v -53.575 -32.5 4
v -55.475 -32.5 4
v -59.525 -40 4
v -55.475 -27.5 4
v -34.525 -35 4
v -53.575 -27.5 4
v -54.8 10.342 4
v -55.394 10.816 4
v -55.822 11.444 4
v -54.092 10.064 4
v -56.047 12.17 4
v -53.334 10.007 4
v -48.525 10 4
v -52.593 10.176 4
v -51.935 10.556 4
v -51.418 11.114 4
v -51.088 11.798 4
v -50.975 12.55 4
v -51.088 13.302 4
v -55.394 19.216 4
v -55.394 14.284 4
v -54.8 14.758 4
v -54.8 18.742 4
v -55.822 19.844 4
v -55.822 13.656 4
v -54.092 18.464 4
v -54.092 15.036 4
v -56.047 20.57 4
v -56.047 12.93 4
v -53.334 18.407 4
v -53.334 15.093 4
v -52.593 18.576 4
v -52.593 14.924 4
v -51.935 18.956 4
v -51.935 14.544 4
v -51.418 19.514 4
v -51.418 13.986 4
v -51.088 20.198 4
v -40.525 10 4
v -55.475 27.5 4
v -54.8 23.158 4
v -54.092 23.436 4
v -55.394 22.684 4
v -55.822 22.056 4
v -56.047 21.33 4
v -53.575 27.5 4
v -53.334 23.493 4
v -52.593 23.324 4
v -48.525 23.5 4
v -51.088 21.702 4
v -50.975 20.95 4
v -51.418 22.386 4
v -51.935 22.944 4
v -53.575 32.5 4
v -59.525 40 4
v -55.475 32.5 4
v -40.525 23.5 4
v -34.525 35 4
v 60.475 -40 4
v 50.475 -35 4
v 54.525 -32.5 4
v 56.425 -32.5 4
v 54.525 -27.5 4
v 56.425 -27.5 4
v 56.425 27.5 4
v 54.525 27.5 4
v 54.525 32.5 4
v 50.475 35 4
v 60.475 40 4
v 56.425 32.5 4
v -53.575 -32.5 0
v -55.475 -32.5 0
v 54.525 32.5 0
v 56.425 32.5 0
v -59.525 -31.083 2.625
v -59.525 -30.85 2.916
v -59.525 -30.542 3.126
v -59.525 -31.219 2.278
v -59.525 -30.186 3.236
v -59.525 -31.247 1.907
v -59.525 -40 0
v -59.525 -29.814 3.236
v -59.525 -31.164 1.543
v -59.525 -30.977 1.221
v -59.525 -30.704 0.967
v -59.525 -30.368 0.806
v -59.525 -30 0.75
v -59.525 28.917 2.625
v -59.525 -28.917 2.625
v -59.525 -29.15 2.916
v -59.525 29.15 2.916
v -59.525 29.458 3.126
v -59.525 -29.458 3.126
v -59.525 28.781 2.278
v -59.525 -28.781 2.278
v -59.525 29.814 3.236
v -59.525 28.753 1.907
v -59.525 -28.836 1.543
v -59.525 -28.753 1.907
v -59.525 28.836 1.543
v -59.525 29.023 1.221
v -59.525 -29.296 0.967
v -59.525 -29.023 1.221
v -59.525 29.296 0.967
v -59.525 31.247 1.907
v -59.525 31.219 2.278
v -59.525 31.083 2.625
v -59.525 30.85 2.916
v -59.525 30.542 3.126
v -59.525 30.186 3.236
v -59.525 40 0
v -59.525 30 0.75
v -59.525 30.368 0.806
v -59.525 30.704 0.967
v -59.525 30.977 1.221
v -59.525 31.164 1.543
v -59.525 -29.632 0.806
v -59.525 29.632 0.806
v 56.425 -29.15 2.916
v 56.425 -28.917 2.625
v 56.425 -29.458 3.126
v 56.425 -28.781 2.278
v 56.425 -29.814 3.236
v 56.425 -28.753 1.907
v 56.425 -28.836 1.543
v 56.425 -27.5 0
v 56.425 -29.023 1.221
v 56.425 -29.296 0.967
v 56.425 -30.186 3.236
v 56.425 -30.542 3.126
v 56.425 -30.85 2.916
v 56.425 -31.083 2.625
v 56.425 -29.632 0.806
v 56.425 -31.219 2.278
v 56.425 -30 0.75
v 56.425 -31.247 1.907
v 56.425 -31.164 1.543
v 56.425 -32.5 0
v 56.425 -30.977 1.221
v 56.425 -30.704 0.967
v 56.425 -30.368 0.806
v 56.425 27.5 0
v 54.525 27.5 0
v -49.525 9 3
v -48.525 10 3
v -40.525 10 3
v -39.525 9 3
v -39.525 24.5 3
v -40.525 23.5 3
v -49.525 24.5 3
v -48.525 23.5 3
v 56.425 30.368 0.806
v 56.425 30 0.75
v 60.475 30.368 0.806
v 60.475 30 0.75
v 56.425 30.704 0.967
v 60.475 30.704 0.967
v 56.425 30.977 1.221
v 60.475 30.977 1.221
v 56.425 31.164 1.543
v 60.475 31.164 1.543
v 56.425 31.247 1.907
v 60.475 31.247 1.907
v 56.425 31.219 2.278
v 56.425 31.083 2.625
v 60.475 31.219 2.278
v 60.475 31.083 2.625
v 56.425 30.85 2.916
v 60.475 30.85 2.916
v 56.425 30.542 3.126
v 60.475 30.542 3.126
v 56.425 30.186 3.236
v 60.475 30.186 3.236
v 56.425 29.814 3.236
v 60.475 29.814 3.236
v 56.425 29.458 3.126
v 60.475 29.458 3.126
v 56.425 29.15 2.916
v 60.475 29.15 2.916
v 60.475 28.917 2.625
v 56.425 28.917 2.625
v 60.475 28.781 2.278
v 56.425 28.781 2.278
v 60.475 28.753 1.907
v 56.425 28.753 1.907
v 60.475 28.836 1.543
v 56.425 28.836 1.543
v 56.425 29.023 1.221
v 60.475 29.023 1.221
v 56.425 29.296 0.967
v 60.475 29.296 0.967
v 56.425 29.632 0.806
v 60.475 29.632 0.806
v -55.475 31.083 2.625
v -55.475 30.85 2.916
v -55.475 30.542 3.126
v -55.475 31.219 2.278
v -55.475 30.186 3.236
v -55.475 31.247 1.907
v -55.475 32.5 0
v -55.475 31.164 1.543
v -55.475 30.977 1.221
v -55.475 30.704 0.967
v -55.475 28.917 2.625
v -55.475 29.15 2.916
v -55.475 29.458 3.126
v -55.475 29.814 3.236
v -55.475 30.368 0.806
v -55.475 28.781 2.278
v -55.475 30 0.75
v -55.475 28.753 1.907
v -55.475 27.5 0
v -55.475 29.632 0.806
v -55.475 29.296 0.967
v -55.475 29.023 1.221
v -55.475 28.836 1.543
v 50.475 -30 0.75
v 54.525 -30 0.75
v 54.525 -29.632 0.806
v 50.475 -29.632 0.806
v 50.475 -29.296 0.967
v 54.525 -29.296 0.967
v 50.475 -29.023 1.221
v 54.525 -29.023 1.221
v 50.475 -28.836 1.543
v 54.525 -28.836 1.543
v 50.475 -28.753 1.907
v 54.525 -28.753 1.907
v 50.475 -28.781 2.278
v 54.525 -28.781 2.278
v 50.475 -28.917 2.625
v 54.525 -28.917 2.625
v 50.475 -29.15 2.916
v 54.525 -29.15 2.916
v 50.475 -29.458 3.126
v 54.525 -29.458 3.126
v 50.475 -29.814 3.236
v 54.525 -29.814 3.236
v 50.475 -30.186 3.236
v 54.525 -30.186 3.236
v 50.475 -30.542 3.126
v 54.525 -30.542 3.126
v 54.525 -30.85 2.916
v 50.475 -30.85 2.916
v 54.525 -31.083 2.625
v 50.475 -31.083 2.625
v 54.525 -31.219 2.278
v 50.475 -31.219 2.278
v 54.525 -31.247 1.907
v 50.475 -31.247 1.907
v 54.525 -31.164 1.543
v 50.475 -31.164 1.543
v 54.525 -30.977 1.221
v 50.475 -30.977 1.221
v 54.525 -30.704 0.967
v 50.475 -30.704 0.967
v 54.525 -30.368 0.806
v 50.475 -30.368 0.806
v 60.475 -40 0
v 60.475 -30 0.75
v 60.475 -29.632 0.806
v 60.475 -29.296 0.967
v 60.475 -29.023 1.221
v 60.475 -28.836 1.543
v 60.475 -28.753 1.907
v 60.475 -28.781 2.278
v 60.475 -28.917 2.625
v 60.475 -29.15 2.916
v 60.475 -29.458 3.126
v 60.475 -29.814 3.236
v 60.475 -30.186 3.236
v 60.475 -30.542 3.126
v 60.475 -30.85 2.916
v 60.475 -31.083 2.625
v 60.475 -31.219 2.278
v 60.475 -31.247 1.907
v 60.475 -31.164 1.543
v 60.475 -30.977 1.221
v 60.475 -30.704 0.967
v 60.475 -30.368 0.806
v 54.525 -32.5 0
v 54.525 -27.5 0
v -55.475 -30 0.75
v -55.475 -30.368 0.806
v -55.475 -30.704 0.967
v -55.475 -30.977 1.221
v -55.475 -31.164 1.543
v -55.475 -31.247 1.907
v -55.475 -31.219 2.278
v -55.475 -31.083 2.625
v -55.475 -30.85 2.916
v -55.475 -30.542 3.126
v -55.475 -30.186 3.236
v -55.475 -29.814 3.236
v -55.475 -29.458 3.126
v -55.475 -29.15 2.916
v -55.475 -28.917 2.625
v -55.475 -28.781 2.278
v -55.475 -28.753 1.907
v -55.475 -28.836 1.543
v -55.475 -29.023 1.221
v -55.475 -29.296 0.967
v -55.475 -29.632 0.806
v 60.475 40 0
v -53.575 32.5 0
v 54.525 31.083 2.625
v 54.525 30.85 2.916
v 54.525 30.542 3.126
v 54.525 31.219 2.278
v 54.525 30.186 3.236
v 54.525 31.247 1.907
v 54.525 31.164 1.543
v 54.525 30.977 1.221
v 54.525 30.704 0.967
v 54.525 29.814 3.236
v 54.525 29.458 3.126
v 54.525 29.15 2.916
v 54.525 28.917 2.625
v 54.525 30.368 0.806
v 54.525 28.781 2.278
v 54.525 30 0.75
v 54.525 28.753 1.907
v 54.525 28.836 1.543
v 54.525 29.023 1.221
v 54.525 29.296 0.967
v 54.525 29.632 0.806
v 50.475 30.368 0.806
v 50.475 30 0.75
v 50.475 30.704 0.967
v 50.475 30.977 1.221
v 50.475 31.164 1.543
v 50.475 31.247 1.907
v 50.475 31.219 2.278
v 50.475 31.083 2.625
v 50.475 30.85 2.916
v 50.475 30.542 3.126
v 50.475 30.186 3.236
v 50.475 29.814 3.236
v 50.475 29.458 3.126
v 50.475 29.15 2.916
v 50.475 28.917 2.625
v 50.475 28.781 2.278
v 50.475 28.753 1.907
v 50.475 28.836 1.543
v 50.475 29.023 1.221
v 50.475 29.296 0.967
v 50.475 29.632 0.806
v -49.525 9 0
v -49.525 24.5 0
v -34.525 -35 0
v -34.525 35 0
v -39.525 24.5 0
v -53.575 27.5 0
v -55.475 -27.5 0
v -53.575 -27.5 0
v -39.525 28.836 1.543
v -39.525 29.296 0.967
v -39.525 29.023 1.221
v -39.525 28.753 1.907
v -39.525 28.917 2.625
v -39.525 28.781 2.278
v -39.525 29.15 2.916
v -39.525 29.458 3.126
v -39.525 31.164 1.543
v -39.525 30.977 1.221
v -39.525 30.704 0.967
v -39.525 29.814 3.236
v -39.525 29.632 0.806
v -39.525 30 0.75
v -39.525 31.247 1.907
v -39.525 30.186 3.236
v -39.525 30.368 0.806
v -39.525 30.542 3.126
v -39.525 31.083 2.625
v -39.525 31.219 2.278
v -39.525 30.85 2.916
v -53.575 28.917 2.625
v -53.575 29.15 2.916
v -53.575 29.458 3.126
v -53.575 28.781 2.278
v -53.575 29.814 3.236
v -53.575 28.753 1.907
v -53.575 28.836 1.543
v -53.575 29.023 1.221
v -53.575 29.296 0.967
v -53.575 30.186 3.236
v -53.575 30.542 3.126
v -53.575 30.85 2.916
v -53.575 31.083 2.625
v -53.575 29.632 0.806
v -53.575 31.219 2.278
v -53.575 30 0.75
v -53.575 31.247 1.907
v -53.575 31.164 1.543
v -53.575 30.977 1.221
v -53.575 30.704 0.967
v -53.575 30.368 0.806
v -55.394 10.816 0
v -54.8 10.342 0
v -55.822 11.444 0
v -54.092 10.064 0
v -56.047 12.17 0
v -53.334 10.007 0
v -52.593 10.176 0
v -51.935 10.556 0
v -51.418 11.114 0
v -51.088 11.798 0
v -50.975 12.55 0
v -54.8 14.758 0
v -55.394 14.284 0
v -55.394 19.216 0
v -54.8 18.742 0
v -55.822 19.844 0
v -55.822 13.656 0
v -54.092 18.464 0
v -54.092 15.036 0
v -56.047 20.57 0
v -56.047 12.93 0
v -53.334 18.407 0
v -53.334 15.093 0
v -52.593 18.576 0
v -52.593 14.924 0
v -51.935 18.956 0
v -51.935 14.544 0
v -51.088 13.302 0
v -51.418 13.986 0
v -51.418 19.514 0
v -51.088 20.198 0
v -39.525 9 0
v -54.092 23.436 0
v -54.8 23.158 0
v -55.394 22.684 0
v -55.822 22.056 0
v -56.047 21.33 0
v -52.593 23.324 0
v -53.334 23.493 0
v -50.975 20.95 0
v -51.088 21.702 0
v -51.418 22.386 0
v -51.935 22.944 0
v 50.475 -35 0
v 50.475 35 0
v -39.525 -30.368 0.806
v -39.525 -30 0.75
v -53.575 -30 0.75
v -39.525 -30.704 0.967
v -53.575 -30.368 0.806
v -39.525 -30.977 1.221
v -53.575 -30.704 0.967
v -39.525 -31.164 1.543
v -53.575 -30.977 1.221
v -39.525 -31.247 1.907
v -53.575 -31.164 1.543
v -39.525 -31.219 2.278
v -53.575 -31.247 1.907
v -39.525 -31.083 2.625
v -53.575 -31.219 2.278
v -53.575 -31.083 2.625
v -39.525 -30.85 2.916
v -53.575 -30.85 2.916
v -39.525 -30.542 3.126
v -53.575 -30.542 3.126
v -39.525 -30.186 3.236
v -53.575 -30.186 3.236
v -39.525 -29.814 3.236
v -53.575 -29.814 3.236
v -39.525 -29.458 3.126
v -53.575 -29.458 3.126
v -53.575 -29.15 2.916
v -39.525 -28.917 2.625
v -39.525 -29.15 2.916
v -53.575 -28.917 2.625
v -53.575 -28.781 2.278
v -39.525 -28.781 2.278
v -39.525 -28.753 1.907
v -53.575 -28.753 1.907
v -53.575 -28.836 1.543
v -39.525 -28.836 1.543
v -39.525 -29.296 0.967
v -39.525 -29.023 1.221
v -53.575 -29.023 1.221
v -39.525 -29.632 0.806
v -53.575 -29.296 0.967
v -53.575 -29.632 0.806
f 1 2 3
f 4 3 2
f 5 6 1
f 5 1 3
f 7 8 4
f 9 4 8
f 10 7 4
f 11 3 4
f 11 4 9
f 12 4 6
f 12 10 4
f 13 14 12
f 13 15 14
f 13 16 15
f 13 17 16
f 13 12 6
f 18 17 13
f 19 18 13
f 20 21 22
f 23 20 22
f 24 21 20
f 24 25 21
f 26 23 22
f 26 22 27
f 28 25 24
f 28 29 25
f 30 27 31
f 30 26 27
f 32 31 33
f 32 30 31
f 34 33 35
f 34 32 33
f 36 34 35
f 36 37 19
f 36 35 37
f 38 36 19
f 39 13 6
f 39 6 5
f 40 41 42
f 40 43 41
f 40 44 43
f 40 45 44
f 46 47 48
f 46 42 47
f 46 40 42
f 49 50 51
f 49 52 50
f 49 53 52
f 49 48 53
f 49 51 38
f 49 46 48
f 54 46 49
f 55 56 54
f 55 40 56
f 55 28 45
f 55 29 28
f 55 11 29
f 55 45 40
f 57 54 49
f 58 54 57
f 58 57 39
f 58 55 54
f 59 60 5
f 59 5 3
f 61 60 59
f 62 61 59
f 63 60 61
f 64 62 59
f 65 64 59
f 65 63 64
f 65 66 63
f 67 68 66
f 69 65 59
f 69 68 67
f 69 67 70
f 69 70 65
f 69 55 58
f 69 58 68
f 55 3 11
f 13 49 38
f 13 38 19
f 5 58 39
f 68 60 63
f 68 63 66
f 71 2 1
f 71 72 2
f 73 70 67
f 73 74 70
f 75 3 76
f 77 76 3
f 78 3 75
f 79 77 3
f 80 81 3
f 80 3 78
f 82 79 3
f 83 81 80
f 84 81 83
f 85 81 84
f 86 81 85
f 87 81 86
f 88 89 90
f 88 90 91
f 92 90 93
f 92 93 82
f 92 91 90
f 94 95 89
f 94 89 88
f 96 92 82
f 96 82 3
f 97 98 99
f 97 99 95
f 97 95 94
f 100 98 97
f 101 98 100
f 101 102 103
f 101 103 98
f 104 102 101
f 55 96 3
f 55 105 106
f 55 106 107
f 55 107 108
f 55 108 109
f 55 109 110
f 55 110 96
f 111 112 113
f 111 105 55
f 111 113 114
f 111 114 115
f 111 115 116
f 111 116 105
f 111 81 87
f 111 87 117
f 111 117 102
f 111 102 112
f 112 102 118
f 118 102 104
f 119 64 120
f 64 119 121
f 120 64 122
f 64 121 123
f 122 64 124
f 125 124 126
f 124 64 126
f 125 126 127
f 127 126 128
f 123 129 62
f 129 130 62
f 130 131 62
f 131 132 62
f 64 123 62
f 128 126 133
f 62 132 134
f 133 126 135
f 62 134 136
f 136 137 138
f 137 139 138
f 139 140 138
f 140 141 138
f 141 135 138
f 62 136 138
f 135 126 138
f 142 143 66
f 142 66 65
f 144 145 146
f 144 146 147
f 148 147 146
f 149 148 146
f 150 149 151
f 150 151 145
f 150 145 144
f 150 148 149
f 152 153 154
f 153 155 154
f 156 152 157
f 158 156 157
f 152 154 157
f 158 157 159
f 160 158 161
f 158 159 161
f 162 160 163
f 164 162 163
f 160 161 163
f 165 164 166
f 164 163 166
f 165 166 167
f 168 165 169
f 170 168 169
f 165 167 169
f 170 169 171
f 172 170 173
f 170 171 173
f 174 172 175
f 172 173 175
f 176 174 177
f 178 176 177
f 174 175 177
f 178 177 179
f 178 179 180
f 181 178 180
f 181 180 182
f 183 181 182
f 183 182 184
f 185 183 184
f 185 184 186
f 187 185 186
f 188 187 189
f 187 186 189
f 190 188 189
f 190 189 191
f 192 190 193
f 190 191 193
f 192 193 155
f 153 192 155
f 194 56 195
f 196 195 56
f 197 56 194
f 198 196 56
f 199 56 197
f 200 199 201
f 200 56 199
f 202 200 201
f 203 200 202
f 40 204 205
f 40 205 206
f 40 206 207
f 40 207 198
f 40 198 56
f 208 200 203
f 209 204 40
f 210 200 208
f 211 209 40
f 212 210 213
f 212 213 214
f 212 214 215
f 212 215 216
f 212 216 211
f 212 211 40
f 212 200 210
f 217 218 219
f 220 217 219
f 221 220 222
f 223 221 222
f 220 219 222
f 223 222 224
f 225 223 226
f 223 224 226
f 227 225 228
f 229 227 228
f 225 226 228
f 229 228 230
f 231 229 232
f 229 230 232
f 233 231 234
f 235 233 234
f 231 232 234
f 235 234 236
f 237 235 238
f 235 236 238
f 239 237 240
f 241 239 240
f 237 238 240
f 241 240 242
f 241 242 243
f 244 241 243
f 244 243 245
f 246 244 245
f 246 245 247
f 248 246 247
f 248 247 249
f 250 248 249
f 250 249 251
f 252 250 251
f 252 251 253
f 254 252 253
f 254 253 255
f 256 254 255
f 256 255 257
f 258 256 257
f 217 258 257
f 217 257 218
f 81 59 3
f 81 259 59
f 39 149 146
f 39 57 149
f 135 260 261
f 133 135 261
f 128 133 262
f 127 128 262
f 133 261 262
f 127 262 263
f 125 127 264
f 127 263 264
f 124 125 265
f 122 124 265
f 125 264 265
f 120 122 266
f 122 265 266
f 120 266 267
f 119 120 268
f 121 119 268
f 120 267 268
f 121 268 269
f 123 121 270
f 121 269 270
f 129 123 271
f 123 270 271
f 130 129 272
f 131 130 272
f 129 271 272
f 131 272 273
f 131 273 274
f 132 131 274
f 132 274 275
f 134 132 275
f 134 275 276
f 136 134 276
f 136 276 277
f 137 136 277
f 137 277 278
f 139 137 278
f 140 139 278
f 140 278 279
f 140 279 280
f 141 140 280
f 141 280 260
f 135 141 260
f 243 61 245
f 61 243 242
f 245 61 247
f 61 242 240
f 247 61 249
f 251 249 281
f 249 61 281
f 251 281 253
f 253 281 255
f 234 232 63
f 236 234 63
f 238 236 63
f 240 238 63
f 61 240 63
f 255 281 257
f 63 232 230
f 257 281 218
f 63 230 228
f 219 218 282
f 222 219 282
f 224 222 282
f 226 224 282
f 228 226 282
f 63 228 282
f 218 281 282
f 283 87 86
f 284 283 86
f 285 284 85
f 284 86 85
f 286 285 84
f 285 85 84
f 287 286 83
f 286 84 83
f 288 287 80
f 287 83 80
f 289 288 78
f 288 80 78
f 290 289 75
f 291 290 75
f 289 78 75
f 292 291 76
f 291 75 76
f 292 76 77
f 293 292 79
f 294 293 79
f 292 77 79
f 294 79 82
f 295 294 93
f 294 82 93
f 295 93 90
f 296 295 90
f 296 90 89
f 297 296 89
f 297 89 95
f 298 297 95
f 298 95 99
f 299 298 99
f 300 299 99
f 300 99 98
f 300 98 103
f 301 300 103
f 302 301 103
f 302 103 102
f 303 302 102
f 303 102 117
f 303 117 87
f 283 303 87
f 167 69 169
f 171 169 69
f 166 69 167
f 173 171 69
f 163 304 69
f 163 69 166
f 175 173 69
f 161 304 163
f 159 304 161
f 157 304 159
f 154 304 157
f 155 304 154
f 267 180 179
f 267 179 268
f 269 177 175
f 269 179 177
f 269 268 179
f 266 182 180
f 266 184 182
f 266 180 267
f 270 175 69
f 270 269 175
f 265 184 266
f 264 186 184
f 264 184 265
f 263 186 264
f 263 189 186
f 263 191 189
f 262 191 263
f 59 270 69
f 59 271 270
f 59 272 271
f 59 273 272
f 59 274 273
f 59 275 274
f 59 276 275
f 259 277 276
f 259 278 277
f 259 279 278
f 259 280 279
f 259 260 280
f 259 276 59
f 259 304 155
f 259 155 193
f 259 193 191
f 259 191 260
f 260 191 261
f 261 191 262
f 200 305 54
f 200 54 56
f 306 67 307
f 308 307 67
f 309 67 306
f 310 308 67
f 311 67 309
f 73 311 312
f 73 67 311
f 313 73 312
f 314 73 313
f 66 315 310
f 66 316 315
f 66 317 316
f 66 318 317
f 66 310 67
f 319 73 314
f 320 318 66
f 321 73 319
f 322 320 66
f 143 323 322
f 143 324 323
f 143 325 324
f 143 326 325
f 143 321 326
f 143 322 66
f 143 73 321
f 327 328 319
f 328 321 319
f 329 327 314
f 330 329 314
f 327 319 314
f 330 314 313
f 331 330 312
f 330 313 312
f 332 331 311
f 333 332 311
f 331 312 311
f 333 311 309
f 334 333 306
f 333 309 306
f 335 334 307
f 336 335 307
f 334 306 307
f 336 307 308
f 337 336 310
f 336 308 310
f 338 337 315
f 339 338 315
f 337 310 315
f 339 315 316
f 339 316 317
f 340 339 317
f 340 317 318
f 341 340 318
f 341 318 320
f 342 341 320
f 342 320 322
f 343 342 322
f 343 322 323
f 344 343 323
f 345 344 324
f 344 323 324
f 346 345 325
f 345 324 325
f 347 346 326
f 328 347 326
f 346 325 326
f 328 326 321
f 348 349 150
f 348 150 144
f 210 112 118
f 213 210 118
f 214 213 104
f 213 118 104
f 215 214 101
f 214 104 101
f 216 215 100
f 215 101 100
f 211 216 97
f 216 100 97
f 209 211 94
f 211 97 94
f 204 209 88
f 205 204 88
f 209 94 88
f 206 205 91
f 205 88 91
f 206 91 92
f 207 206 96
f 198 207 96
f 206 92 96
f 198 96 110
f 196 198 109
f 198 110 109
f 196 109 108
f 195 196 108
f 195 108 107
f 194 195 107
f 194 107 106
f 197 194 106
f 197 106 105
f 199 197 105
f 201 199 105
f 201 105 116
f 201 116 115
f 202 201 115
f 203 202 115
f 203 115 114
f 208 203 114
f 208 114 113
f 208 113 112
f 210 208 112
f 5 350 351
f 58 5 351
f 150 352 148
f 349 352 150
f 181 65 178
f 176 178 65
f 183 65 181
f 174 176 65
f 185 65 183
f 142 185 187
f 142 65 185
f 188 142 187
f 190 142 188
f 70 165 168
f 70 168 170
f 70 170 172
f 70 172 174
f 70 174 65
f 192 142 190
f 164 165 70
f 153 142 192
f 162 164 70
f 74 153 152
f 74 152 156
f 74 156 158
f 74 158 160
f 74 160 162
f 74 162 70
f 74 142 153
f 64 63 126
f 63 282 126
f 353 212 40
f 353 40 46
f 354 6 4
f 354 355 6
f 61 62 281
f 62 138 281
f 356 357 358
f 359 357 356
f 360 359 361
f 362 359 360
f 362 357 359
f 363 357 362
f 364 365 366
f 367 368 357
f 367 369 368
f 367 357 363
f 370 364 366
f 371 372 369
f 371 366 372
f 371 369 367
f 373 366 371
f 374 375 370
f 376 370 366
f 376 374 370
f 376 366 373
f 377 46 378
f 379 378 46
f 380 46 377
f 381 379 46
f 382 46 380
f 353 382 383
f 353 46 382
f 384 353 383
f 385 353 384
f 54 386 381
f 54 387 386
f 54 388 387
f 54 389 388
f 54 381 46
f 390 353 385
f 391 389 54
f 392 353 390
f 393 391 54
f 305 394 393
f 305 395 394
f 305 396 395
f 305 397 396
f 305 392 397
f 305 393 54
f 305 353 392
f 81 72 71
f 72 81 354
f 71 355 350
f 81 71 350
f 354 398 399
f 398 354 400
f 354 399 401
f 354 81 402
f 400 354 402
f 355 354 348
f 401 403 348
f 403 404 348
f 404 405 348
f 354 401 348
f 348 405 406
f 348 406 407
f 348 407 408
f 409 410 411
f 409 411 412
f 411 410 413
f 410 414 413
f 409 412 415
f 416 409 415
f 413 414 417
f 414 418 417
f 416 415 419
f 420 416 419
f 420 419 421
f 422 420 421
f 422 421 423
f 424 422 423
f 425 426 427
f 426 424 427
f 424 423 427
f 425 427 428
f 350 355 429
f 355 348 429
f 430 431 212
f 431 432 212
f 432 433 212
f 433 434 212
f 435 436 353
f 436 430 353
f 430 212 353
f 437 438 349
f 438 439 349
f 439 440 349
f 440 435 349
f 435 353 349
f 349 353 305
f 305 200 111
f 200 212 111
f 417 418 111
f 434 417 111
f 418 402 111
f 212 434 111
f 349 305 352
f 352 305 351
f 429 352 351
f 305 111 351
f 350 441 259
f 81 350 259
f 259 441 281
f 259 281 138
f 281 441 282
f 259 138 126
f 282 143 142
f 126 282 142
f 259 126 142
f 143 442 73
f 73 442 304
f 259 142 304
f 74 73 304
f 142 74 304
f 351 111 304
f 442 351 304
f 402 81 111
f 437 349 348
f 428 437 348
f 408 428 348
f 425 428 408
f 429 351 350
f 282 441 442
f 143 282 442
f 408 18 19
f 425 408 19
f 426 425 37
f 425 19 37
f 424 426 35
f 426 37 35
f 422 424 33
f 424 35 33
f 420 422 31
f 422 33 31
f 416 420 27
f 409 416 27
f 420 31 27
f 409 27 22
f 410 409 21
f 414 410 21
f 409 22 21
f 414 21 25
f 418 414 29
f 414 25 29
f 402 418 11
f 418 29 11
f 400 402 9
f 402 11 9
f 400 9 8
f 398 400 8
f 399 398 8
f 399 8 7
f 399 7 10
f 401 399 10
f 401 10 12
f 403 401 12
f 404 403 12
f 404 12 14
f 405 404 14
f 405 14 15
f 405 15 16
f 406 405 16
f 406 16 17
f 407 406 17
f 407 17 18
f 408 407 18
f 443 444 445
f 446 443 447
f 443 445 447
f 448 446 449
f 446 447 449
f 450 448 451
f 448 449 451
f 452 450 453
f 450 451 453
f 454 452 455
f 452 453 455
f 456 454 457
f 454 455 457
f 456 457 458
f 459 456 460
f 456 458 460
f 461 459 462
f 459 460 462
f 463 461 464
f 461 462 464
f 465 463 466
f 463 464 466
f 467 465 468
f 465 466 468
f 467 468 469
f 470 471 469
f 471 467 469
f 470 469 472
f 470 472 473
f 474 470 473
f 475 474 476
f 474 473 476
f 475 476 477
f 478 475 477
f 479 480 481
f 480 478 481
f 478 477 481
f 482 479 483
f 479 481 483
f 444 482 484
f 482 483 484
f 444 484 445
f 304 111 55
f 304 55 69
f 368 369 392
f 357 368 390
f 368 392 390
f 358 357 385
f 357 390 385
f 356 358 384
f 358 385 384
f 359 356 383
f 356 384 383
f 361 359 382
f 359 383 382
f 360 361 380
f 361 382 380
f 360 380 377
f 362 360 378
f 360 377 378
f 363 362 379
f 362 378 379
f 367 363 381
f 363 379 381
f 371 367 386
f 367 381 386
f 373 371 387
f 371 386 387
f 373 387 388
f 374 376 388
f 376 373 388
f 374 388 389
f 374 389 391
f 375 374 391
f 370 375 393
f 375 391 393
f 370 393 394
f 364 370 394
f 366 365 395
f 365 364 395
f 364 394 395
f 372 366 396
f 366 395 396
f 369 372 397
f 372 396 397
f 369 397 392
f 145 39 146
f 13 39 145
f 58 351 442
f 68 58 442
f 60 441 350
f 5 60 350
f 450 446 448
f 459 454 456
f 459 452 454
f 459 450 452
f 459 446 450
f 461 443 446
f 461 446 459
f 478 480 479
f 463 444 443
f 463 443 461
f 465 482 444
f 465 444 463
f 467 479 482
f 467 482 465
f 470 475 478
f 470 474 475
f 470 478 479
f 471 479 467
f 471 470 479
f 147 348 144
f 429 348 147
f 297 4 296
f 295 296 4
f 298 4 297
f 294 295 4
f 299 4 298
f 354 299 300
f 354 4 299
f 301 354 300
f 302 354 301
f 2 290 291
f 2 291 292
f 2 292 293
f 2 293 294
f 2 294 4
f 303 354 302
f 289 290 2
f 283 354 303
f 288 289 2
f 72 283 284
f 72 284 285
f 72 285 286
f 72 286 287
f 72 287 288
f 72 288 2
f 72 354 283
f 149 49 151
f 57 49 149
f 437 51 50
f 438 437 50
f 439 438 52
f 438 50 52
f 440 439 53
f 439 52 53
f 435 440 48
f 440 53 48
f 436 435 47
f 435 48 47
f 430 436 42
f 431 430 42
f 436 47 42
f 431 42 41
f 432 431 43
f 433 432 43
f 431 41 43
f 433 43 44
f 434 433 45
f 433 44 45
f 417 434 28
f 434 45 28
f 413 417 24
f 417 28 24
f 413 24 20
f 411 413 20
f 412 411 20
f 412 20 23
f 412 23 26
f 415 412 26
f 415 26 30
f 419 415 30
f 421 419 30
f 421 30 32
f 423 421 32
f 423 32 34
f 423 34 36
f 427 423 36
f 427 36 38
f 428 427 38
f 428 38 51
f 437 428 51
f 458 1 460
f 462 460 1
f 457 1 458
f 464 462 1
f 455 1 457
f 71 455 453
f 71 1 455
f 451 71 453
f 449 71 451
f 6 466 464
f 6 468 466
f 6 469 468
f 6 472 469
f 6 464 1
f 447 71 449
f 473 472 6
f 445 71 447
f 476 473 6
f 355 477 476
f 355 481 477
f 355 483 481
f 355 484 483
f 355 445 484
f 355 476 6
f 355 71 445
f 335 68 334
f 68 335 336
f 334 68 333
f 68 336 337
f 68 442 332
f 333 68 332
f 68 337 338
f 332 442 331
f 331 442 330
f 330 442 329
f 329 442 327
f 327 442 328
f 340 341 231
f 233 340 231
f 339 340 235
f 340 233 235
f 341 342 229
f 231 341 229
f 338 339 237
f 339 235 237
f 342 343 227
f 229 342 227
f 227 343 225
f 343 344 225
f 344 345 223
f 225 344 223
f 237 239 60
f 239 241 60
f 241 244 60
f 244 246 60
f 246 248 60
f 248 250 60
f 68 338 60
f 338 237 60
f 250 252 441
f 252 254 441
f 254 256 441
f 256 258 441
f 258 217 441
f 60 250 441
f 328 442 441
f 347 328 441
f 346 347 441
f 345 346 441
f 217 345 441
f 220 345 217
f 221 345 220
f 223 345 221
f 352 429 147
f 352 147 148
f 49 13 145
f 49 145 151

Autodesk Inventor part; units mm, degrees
ref_plane "YZ Plane" through (0, 0, 0) normal (1, 0, 0) x (0, 1, 0)
ref_plane "XZ Plane" through (0, 0, 0) normal (0, 1, 0) x (-1, 0, 0)
sketch "Sketch1" plane through (0, 0, 0) normal (0, 0, 1) x (1, 0, 0)
  line L0 (-59.525, 40) -> (60.475, 40)
  line L1 (60.475, 40) -> (60.475, -40)
  line L2 (60.475, -40) -> (-59.525, -40)
  line L3 (-59.525, -40) -> (-59.525, 40)
  line L4 (-59.525, 40) -> (60.475, -40) construction
  line L5 (60.475, 40) -> (-59.525, -40) construction
  line L6 (-34.525, -65) -> (-34.525, 60.8703) construction
  line L7 (50.475, -61.0061) -> (50.475, 64.8642) construction
  line L8 (-67.2304, -35) -> (77.4738, -35) construction
  line L9 (-68.2264, 35) -> (76.4779, 35) construction
  line L10 (-2.025, -66.0646) -> (-2.025, 59.8057) construction
  line L11 (2.975, -64.9269) -> (2.975, 60.9434) construction
  line L12 (-67.6256, -30) -> (77.0786, -30) construction
  line L13 (-69.0671, 30) -> (75.6371, 30) construction
  line L14 (55.475, -60.5874) -> (55.475, 65.2829) construction
  line L15 (-54.525, -62.7211) -> (-54.525, 63.1492) construction
  line L16 (-55.475, -32.5) -> (-53.575, -32.5)
  line L17 (-53.575, -32.5) -> (-53.575, -27.5)
  line L18 (-53.575, -27.5) -> (-55.475, -27.5)
  line L19 (-55.475, -27.5) -> (-55.475, -32.5)
  line L20 (-55.475, -32.5) -> (-53.575, -27.5) construction
  line L21 (-53.575, -32.5) -> (-55.475, -27.5) construction
  line L22 (56.425, -32.5) -> (54.525, -32.5)
  line L23 (54.525, -32.5) -> (54.525, -27.5)
  line L24 (54.525, -27.5) -> (56.425, -27.5)
  line L25 (56.425, -27.5) -> (56.425, -32.5)
  line L26 (56.425, -32.5) -> (54.525, -27.5) construction
  line L27 (54.525, -32.5) -> (56.425, -27.5) construction
  line L28 (-53.575, 32.5) -> (-55.475, 32.5)
  line L29 (-55.475, 32.5) -> (-55.475, 27.5)
  line L30 (-55.475, 27.5) -> (-53.575, 27.5)
  line L31 (-53.575, 27.5) -> (-53.575, 32.5)
  line L32 (-53.575, 32.5) -> (-55.475, 27.5) construction
  line L33 (-55.475, 32.5) -> (-53.575, 27.5) construction
  line L34 (56.425, 32.5) -> (54.525, 32.5)
  line L35 (54.525, 32.5) -> (54.525, 27.5)
  line L36 (54.525, 27.5) -> (56.425, 27.5)
  line L37 (56.425, 27.5) -> (56.425, 32.5)
  line L38 (56.425, 32.5) -> (54.525, 27.5) construction
  line L39 (54.525, 32.5) -> (56.425, 27.5) construction
  line L40 (-34.525, 35) -> (50.475, 35)
  line L41 (50.475, 35) -> (50.475, -35)
  line L42 (50.475, -35) -> (-34.525, -35)
  line L43 (-34.525, -35) -> (-34.525, 35)
  point P0 (0.475, 0)
  point P1 (-2.025, 35)
  point P2 (2.975, -35)
  point P3 (50.475, 35)
  point P4 (55.475, 36)
  point P5 (56, 37)
  point P6 (-54.525, -30)
  point P7 (55.475, -30)
  point P8 (-54.525, 30)
  point P9 (55.475, 30)
  dimension "d0" = 120
  dimension "d1" = 80
  dimension "d9" = 25
  dimension "d10" = 10
  dimension "d11" = 5
  dimension "d12" = 5
  dimension "d20" = 10
  dimension "d21" = 10
  dimension "d22" = 5
  dimension "d23" = 5
  dimension "d26" = 1.9
  dimension "d27" = 5
  dimension "d28" = 1.9
  dimension "d29" = 1.9
  dimension "d30" = 5
  dimension "d31" = 1.9
extrude "Extrusion1" add sketch "Sketch1" along normal blind 4 contours L0 L1 L2 L3 | L19 L18 L17 L16 | L22 L23 L24 L25 | L31 L30 L29 L28 | L37 L36 L35 L34 | L40 L41 L42 L43
sketch "Sketch2" plane through (60.475, -40, 0) normal (1, 0, 0) x (0, 0, -1)
  line L0 (0, 40) -> (-8.8455, 40) construction
  line L1 (-2, -5.0193) -> (-2, 56.2537) construction
  line L2 (-4, 0) -> (-4, 80) construction
  line L3 (1.2244, 10) -> (-7.6211, 10) construction
  line L4 (0, 0) -> (-4, 0) construction
  circle A0 centre (-2, 10) radius 1.25
  circle A1 centre (-2, 70) radius 1.25
  dimension "d4" = 2
  dimension "d5" = 10
  dimension "d6" = 2.5
extrude "Extrusion3" cut sketch "Sketch2" against normal blind 20
extrude "Extrusion4" cut sketch "Sketch1" along normal blind 10 contours L19 L18 L17 L16 | L22 L23 L24 L25 | L31 L30 L29 L28 | L37 L36 L35 L34
ref_plane "Work Plane1" through (0.475, -40, 0) normal (1, 0, 0) x (0, 0, -1)
mirror "Mirror1" about plane through (0.475, -40, 0) normal (1, 0, 0) of "Extrusion3"
extrude "Extrusion6" cut sketch "Sketch1" along normal blind 10 contours L40 L41 L42 L43
sketch "Sketch3" plane through (0, 0, 4) normal (0, 0, 1) x (1, 0, 0)
  line L0 (0, 0) -> (-78.4813, 0) construction
  line L1 (-44.525, 48.1643) -> (-44.525, -53.6198) construction
  line L2 (-34.525, -35) -> (-34.525, 35) construction
  line L3 (-48.525, 23.5) -> (-40.525, 23.5)
  line L4 (-40.525, 23.5) -> (-40.525, 10)
  line L5 (-40.525, 10) -> (-48.525, 10)
  line L6 (-48.525, 10) -> (-48.525, 23.5)
  line L7 (-53.525, 48.2216) -> (-53.525, -53.5625) construction
  circle A0 centre (-53.525, 20.95) radius 2.55
  circle A1 centre (-53.525, 12.55) radius 2.55
  line L8 (-47.3423, 23.5) -> (-70.4402, 23.5) construction
  line L9 (-47.3423, 10) -> (-69.2245, 10) construction
  line L10 (60.475, 40) -> (-59.525, 40) projected
  point P0 (-44.525, 0)
  point P1 (-53.525, 1)
  dimension "d38" = 10
  dimension "d39" = 8
  dimension "d40" = 13.5
  dimension "d41" = 5
  dimension "d42" = 5.1
  dimension "d43" = 5.1
  dimension "d47" = 30
extrude "Extrusion7" cut sketch "Sketch3" against normal blind 10
sketch "Sketch5" plane through (0, 0, 0) normal (0, 0, -1) x (-1, 0, 0)
  line L0 (48.525, 10) -> (40.525, 10) construction
  line L1 (40.525, 10) -> (40.525, 23.5) construction
  line L2 (40.525, 23.5) -> (48.525, 23.5) construction
  line L3 (48.525, 23.5) -> (48.525, 10) construction
  line L4 (48.525, 10) -> (40.525, 10) construction
  line L5 (48.525, 23.5) -> (48.525, 10) construction
  line L6 (49.525, 9) -> (39.525, 9)
  line L7 (39.525, 9) -> (39.525, 24.5)
  line L8 (39.525, 24.5) -> (49.525, 24.5)
  line L9 (49.525, 24.5) -> (49.525, 9)
  point P0 (0, 0)
  dimension "d48" = 1
extrude "Extrusion8" cut sketch "Sketch5" against normal blind 3
properties part number "Topshelf"
